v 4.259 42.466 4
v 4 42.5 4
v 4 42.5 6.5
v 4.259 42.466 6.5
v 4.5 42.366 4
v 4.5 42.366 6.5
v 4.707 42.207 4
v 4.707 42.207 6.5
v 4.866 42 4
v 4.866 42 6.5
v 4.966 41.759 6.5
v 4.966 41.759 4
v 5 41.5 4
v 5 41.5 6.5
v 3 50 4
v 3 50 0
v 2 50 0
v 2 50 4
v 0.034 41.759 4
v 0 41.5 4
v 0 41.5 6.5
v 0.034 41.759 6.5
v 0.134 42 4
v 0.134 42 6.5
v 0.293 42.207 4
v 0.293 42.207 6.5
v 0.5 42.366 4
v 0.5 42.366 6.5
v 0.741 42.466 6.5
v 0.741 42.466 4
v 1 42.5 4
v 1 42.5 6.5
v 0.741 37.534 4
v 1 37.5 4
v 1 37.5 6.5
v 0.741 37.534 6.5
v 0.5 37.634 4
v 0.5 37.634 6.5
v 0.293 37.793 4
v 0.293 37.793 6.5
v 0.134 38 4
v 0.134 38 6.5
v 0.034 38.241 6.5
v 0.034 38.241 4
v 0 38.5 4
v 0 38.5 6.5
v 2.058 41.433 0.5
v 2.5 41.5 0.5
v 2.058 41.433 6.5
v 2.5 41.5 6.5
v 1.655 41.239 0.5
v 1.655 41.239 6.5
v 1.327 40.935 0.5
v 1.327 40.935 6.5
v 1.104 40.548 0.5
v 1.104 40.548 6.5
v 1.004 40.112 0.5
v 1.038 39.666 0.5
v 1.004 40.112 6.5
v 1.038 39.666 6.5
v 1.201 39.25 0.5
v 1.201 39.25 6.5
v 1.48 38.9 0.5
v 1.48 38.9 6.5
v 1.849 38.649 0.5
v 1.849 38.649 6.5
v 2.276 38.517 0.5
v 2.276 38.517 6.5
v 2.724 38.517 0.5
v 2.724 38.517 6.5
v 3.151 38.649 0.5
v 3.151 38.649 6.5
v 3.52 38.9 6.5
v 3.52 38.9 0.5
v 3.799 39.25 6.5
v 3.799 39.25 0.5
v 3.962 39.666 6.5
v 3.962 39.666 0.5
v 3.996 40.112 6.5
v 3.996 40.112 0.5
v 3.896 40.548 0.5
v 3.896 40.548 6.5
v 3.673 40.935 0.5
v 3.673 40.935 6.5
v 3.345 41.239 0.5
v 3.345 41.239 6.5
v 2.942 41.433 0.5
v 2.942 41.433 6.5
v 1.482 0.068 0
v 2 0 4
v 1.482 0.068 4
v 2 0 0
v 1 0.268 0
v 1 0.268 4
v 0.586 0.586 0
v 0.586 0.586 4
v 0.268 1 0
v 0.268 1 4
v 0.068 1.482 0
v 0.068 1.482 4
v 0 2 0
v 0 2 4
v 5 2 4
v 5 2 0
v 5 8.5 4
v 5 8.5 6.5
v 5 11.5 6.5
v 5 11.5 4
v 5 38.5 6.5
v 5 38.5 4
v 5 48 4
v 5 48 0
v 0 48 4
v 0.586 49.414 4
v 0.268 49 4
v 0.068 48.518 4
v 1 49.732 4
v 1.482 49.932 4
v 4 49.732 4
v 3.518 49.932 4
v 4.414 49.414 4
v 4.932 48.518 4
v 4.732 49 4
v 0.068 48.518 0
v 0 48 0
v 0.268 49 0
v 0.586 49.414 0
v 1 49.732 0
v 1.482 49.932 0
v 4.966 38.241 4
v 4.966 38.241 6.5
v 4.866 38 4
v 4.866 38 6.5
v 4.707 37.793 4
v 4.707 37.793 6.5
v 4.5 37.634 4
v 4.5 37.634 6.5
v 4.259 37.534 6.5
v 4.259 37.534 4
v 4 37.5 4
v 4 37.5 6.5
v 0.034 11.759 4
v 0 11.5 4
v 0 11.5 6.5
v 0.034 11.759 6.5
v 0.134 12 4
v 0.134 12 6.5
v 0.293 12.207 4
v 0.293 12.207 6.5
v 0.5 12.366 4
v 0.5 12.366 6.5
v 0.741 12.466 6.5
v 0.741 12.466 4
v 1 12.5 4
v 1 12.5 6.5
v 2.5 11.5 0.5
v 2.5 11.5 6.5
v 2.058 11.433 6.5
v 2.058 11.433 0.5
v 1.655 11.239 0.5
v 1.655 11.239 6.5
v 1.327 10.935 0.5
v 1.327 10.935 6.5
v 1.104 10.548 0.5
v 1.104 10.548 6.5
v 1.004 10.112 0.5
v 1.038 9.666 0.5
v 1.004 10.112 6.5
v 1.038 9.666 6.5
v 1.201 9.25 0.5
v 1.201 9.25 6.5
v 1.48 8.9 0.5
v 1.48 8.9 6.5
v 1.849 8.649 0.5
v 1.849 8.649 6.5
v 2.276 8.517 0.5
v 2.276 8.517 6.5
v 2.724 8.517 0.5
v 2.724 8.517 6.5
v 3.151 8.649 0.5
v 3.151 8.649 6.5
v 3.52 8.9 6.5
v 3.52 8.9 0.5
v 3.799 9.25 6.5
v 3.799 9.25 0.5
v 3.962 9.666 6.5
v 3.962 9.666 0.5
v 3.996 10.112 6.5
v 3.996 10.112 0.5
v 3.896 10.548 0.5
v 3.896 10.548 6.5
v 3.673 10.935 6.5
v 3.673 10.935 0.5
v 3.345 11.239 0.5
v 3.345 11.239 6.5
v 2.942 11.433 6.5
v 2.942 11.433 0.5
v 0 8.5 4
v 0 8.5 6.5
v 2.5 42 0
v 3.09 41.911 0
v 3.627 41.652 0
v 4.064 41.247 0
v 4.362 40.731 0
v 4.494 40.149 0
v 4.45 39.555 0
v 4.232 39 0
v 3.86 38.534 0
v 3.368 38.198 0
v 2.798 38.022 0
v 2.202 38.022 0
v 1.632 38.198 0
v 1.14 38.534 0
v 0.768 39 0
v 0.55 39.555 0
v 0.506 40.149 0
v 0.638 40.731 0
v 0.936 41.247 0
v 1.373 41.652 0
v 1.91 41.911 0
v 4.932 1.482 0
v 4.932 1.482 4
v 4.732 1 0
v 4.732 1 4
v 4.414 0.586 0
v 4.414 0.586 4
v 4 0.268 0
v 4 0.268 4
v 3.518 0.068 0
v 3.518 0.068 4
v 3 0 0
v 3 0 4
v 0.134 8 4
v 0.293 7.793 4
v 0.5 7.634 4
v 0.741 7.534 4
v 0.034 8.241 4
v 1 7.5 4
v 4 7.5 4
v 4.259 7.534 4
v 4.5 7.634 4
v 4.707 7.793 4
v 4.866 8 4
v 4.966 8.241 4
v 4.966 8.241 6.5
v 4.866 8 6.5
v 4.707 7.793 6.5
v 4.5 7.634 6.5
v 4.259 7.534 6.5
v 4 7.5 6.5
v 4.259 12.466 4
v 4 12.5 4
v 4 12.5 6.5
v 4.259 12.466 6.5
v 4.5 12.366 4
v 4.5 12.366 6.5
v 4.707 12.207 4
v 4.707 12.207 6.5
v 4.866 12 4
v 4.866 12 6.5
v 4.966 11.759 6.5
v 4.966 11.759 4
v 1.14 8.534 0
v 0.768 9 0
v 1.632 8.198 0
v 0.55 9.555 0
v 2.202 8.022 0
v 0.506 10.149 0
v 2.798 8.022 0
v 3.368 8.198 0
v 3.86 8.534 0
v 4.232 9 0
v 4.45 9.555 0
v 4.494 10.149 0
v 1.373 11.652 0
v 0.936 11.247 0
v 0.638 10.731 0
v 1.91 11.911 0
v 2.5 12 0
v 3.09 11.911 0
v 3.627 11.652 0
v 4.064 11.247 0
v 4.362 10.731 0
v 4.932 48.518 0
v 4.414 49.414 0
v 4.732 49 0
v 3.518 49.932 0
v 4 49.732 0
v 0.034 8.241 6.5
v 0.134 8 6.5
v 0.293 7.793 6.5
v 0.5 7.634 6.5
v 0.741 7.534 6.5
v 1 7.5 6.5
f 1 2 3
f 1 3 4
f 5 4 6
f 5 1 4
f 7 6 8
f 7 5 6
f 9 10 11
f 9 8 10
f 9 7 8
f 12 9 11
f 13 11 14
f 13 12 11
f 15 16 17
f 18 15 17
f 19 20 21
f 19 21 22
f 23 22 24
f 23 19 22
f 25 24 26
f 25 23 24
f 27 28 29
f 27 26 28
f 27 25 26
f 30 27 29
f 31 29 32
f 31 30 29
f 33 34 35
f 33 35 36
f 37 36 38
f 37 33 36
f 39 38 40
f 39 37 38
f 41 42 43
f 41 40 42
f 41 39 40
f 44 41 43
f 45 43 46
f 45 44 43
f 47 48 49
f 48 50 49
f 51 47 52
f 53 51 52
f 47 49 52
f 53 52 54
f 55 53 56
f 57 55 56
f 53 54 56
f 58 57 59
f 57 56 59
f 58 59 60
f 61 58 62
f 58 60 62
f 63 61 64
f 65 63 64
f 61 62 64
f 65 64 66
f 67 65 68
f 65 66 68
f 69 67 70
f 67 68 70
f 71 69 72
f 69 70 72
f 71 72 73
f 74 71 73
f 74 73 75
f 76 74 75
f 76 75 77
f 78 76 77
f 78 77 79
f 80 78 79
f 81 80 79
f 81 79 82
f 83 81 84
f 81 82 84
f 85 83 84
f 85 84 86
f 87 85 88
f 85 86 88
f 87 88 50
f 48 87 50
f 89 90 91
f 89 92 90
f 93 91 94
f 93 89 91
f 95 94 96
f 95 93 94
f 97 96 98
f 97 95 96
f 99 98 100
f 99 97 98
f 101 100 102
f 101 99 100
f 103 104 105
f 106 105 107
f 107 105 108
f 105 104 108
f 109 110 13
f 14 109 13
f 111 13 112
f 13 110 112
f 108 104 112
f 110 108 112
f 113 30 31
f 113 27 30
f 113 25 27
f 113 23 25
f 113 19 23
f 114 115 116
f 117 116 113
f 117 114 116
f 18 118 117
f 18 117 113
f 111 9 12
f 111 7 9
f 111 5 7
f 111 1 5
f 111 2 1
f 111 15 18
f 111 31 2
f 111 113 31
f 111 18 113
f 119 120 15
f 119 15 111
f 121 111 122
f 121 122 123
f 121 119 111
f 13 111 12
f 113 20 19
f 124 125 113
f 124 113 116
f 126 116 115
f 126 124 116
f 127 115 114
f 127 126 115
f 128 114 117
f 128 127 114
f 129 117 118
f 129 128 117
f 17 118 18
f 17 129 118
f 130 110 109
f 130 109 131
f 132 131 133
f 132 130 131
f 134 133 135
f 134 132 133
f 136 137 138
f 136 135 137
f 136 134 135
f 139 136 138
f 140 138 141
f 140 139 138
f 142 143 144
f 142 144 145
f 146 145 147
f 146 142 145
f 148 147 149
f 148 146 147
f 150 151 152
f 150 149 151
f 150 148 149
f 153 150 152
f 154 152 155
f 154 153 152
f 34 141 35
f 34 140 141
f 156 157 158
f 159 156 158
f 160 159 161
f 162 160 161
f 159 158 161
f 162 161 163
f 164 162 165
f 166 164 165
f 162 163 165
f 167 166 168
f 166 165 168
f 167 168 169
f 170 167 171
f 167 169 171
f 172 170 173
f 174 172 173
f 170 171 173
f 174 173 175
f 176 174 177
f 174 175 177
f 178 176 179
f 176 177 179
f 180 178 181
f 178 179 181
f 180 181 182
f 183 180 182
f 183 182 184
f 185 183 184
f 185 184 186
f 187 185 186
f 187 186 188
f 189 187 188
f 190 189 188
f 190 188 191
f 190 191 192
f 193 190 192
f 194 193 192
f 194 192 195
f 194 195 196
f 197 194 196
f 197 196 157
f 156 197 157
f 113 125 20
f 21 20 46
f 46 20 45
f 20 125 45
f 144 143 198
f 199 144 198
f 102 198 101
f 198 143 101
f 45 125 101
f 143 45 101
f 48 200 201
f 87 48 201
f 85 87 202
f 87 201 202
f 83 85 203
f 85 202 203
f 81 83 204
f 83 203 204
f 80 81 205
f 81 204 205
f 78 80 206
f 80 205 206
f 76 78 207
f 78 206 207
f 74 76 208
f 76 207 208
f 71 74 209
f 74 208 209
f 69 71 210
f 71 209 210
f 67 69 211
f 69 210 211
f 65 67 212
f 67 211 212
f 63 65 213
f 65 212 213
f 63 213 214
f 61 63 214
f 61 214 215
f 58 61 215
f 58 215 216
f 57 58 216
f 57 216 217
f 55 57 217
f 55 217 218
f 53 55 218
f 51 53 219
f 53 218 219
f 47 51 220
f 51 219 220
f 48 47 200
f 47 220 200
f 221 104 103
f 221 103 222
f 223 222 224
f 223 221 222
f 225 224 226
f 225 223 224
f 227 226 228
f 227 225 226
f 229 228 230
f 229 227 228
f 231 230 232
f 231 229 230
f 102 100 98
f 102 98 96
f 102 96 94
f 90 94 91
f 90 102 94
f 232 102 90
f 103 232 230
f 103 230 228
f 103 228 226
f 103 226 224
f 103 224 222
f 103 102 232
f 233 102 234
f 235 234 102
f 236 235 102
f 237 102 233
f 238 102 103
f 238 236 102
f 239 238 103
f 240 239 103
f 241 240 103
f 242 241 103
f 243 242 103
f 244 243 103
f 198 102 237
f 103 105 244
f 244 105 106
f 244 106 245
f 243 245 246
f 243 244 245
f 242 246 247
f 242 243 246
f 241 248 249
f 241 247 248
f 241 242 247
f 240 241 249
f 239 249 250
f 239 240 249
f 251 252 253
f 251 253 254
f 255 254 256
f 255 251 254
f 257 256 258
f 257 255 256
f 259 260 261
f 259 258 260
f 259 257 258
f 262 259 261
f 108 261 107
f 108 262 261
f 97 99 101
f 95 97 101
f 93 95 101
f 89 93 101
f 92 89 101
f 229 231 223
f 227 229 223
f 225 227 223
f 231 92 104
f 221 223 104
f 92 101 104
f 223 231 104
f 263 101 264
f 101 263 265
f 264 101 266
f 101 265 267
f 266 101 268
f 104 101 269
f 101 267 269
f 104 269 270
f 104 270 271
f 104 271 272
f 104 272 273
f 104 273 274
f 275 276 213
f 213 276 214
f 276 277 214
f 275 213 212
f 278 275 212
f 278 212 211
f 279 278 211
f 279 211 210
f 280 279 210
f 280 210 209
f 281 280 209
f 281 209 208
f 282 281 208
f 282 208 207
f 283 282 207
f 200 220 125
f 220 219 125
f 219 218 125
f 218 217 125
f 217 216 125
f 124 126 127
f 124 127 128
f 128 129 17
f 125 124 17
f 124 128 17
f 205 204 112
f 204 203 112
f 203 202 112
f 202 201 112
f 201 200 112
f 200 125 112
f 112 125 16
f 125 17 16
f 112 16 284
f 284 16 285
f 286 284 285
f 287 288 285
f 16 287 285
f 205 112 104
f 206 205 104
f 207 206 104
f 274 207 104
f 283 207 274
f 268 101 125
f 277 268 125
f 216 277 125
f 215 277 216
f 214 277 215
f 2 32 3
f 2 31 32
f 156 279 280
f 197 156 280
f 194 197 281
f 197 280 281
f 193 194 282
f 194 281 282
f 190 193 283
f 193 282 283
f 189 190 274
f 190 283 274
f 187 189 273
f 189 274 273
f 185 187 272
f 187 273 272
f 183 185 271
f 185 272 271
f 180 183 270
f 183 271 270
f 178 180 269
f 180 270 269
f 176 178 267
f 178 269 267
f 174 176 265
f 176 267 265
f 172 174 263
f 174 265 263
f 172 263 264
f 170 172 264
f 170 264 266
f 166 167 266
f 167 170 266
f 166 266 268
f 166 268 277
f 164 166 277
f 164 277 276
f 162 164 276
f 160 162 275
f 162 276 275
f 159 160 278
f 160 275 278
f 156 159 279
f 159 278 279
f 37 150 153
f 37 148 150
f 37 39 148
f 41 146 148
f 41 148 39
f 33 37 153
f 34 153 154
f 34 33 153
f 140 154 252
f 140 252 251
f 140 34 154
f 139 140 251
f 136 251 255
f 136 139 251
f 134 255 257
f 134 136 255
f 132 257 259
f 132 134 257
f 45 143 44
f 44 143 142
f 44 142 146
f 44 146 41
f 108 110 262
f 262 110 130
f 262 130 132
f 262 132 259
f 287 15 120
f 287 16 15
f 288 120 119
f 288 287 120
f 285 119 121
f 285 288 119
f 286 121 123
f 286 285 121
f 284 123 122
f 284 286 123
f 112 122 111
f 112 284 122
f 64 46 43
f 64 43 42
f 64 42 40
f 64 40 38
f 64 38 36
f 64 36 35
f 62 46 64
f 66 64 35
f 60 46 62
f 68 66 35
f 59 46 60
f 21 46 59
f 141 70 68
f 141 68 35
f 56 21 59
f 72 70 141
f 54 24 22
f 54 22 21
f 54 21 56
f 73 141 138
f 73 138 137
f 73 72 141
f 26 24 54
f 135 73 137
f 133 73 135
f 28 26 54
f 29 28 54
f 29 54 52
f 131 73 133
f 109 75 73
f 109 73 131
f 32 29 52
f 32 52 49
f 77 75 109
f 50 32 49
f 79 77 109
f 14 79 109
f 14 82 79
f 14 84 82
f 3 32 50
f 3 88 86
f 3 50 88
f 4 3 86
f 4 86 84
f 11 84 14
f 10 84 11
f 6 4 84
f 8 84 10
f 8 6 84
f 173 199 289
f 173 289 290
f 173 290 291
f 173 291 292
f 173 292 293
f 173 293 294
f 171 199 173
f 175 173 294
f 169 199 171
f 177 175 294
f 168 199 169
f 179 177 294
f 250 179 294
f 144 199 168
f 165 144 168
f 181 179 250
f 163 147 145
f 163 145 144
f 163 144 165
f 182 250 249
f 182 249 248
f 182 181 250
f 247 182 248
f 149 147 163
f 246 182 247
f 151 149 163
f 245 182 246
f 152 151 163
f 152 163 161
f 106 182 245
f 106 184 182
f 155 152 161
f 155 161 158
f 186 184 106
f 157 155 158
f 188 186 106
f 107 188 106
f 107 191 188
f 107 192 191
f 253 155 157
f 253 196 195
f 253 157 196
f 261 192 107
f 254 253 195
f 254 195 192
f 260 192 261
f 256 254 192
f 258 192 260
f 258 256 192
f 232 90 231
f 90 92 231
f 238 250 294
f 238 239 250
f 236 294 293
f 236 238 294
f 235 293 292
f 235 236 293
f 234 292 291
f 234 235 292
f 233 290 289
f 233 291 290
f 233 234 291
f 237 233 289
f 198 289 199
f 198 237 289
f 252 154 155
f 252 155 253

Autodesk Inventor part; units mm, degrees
ref_plane "YZ Plane" through (0, 0, 0) normal (1, 0, 0) x (0, 1, 0)
ref_plane "XZ Plane" through (0, 0, 0) normal (0, 1, 0) x (-1, 0, 0)
ref_plane "XY Plane" through (0, 0, 0) normal (0, 0, 1) x (1, 0, 0)
sketch "Skizze1" plane through (0, 0, 0) normal (0, 0, 1) x (1, 0, 0)
  line L0 (2, 0) -> (3, 0)
  line L1 (5, 2) -> (5, 48)
  line L2 (3, 50) -> (2, 50)
  line L3 (0, 48) -> (0, 2)
  arc A0 (5, 48) -> (3, 50) centre (3, 48) ccw
  arc A1 (3, 0) -> (5, 2) centre (3, 2) ccw
  arc A2 (0, 2) -> (2, 0) centre (2, 2) ccw
  arc A3 (2, 50) -> (0, 48) centre (2, 48) ccw
  point P0 (0, 0)
  point P1 (5, 50)
  point P2 (5, 0)
  point P3 (0, 50)
  dimension "d0" = 5
  dimension "d1" = 50
  dimension "d2" = 2
extrude "Extrusion1" add sketch "Skizze1" along normal blind 4
sketch "Skizze2" plane through (0, 0, 4) normal (0, 0, 1) x (1, 0, 0)
  line L0 (5, 2) -> (5, 48) projected
  line L1 (3, 50) -> (2, 50) projected
  line L2 (2, 0) -> (3, 0) projected
  line L3 (0, 48) -> (0, 2) projected
  line L4 (1, 42.5) -> (4, 42.5)
  line L5 (5, 41.5) -> (5, 38.5)
  line L6 (4, 37.5) -> (1, 37.5)
  line L7 (0, 38.5) -> (0, 41.5)
  line L8 (1, 12.5) -> (4, 12.5)
  line L9 (5, 11.5) -> (5, 8.5)
  line L10 (4, 7.5) -> (1, 7.5)
  line L11 (0, 8.5) -> (0, 11.5)
  arc A0 (5, 41.5) -> (4, 42.5) centre (4, 41.5) ccw
  arc A1 (4, 37.5) -> (5, 38.5) centre (4, 38.5) ccw
  arc A2 (0, 38.5) -> (1, 37.5) centre (1, 38.5) ccw
  arc A3 (1, 42.5) -> (0, 41.5) centre (1, 41.5) ccw
  arc A4 (5, 11.5) -> (4, 12.5) centre (4, 11.5) ccw
  arc A5 (4, 7.5) -> (5, 8.5) centre (4, 8.5) ccw
  arc A6 (0, 8.5) -> (1, 7.5) centre (1, 8.5) ccw
  arc A7 (1, 12.5) -> (0, 11.5) centre (1, 11.5) ccw
  point P0 (0, 0)
  point P1 (0, 42.5)
  point P2 (5, 37.5)
  point P3 (0, 12.5)
  point P4 (5, 7.5)
  dimension "d12" = 1
  dimension "d13" = 7.5
  dimension "d14" = 5
  dimension "d15" = 5
  dimension "d16" = 7.5
extrude "Extrusion2" add sketch "Skizze2" along normal blind 2.5 contours A5 L10 A6 L3 A7 L8 A4 L0 | A1 L6 A2 L3 A3 L4 A0 L0
hole "Bohrung2" at (2.5, 40, 0) direction (0, 0, 1) diameter 3 end through all countersink diameter 4 countersink angle 90
hole "Bohrung3" at (2.5, 10, 0) direction (0, 0, 1) diameter 3 end through all countersink diameter 4 countersink angle 90
equation "\"d15\" = d14"
equation "\"d16\" = d13"
equation "\"d26\" = 0.5 * d0"
equation "\"d27\" = 0.5 * d14"
equation "\"d36\" = 0.5 * d15"
properties part number "Halter"
